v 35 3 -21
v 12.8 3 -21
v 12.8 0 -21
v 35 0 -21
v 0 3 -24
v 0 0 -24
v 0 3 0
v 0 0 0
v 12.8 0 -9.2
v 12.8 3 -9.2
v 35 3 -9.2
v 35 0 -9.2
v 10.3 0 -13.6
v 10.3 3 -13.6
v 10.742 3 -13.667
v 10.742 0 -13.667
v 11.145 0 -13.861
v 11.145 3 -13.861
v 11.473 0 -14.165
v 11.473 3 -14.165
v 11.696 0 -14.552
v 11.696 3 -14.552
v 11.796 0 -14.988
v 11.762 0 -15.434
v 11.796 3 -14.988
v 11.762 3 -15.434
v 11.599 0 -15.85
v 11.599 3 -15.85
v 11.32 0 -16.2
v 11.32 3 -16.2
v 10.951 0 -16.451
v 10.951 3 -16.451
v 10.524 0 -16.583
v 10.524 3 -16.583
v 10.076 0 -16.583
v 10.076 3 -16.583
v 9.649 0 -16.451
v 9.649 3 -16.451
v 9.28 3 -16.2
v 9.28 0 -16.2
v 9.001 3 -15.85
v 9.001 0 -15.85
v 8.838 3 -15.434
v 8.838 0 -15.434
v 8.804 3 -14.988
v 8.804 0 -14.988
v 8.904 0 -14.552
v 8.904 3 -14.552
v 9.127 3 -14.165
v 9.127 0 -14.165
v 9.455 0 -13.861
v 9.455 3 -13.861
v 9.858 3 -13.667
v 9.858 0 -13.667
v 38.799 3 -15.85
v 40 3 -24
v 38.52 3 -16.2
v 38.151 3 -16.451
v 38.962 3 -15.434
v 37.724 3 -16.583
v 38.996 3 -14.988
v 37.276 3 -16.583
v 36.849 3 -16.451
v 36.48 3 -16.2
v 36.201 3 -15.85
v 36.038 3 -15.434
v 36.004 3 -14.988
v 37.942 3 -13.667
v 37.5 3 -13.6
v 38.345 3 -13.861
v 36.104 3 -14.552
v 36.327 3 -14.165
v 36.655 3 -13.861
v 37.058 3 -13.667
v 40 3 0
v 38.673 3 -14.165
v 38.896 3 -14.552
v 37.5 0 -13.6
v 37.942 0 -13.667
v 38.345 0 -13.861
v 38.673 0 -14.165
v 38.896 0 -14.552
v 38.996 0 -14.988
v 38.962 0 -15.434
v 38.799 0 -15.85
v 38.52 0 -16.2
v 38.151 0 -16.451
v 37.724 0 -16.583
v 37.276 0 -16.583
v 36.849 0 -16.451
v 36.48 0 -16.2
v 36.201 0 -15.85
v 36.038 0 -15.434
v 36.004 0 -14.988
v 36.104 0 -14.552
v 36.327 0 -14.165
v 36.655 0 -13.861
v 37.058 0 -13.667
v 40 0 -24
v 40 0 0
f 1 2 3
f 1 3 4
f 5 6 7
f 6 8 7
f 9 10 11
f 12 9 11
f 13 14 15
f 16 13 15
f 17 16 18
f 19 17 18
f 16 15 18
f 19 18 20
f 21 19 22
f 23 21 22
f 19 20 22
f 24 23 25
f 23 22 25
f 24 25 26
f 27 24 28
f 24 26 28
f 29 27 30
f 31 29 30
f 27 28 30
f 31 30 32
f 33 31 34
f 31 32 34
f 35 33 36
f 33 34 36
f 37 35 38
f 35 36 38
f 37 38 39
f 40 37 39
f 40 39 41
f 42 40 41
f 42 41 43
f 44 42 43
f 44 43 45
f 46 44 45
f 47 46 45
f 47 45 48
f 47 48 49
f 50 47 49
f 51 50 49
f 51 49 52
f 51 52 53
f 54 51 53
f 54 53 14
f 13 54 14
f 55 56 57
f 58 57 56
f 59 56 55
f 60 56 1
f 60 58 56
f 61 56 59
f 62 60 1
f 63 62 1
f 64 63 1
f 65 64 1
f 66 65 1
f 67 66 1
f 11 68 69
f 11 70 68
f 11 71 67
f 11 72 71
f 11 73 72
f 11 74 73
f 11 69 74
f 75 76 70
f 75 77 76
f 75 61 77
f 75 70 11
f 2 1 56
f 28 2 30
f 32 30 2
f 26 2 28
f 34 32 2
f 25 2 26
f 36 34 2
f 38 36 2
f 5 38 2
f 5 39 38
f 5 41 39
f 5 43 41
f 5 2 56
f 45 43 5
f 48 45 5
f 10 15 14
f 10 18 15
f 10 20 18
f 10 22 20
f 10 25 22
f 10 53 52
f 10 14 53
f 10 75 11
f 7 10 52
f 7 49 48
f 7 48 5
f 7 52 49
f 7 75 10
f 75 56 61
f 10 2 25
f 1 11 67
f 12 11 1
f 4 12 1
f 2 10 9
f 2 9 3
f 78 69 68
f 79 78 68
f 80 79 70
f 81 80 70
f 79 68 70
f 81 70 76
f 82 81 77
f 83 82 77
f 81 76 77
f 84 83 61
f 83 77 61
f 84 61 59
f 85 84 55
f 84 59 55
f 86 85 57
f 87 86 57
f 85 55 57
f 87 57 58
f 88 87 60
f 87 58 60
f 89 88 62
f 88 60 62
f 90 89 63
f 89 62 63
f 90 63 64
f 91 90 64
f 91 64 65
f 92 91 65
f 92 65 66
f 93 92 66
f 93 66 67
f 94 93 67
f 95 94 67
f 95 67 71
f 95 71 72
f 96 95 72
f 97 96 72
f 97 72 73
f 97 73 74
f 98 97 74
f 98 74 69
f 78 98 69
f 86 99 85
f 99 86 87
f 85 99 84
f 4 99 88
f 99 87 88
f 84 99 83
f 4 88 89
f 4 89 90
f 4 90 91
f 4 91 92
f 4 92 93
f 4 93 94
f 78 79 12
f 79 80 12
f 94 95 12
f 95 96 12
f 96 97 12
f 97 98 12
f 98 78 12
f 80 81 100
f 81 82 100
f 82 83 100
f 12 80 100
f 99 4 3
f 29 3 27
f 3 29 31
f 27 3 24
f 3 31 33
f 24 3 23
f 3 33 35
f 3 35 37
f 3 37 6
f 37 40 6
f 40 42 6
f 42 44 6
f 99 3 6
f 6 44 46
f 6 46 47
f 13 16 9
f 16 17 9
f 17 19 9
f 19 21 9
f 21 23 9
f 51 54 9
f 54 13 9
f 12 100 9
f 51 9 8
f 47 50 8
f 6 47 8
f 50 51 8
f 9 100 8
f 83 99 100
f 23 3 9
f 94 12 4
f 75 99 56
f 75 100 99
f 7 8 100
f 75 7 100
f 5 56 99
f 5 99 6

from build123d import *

# Parameters (mm, degrees)
SKETCH1_W           = 40
SKETCH1_H           = 21
BOSS_EXTRUDE1_DEPTH = 3
SKETCH2_W           = 40
SKETCH2_H           = 3
BOSS_EXTRUDE2_DEPTH = 3
SKETCH3_W           = 22.2
SKETCH3_H           = 11.8
CUT_EXTRUDE1_DEPTH  = 10
SKETCH4_R           = 1.5
CUT_EXTRUDE2_DEPTH  = 10


with BuildPart() as part:
    # Sketch1 → Boss-Extrude1 (new body)
    with BuildSketch(Plane(origin=(0, 0, 0), x_dir=(1, 0, 0), z_dir=(0, 1, 0))):
        with Locations((20, 10.5)):
            Rectangle(SKETCH1_W, SKETCH1_H)
    extrude(amount=BOSS_EXTRUDE1_DEPTH)

    # Sketch2 → Boss-Extrude2 (add)
    with BuildSketch(Plane(origin=(0, 0, -21), x_dir=(-1, 0, 0), z_dir=(0, 0, -1))):
        with Locations((-20, 1.5)):
            Rectangle(SKETCH2_W, SKETCH2_H)
    extrude(amount=BOSS_EXTRUDE2_DEPTH)

    # Sketch3 → Cut-Extrude1 (cut)
    with BuildSketch(Plane(origin=(0, 3, 0), x_dir=(1, 0, 0), z_dir=(0, 1, 0))):
        with Locations((23.9, 15.1)):
            Rectangle(SKETCH3_W, SKETCH3_H)
    extrude(amount=-CUT_EXTRUDE1_DEPTH, mode=Mode.SUBTRACT)

    # Sketch4 → Cut-Extrude2 (cut)
    with BuildSketch(Plane(origin=(0, 3, 0), x_dir=(1, 0, 0), z_dir=(0, 1, 0))):
        with Locations(Location((10.3, 15.1, 0), (0, 0, 270))):
            Circle(SKETCH4_R)
        with Locations(Location((37.5, 15.1, 0), (0, 0, 270))):
            Circle(SKETCH4_R)
    extrude(amount=-CUT_EXTRUDE2_DEPTH, mode=Mode.SUBTRACT)


solid = part.part
